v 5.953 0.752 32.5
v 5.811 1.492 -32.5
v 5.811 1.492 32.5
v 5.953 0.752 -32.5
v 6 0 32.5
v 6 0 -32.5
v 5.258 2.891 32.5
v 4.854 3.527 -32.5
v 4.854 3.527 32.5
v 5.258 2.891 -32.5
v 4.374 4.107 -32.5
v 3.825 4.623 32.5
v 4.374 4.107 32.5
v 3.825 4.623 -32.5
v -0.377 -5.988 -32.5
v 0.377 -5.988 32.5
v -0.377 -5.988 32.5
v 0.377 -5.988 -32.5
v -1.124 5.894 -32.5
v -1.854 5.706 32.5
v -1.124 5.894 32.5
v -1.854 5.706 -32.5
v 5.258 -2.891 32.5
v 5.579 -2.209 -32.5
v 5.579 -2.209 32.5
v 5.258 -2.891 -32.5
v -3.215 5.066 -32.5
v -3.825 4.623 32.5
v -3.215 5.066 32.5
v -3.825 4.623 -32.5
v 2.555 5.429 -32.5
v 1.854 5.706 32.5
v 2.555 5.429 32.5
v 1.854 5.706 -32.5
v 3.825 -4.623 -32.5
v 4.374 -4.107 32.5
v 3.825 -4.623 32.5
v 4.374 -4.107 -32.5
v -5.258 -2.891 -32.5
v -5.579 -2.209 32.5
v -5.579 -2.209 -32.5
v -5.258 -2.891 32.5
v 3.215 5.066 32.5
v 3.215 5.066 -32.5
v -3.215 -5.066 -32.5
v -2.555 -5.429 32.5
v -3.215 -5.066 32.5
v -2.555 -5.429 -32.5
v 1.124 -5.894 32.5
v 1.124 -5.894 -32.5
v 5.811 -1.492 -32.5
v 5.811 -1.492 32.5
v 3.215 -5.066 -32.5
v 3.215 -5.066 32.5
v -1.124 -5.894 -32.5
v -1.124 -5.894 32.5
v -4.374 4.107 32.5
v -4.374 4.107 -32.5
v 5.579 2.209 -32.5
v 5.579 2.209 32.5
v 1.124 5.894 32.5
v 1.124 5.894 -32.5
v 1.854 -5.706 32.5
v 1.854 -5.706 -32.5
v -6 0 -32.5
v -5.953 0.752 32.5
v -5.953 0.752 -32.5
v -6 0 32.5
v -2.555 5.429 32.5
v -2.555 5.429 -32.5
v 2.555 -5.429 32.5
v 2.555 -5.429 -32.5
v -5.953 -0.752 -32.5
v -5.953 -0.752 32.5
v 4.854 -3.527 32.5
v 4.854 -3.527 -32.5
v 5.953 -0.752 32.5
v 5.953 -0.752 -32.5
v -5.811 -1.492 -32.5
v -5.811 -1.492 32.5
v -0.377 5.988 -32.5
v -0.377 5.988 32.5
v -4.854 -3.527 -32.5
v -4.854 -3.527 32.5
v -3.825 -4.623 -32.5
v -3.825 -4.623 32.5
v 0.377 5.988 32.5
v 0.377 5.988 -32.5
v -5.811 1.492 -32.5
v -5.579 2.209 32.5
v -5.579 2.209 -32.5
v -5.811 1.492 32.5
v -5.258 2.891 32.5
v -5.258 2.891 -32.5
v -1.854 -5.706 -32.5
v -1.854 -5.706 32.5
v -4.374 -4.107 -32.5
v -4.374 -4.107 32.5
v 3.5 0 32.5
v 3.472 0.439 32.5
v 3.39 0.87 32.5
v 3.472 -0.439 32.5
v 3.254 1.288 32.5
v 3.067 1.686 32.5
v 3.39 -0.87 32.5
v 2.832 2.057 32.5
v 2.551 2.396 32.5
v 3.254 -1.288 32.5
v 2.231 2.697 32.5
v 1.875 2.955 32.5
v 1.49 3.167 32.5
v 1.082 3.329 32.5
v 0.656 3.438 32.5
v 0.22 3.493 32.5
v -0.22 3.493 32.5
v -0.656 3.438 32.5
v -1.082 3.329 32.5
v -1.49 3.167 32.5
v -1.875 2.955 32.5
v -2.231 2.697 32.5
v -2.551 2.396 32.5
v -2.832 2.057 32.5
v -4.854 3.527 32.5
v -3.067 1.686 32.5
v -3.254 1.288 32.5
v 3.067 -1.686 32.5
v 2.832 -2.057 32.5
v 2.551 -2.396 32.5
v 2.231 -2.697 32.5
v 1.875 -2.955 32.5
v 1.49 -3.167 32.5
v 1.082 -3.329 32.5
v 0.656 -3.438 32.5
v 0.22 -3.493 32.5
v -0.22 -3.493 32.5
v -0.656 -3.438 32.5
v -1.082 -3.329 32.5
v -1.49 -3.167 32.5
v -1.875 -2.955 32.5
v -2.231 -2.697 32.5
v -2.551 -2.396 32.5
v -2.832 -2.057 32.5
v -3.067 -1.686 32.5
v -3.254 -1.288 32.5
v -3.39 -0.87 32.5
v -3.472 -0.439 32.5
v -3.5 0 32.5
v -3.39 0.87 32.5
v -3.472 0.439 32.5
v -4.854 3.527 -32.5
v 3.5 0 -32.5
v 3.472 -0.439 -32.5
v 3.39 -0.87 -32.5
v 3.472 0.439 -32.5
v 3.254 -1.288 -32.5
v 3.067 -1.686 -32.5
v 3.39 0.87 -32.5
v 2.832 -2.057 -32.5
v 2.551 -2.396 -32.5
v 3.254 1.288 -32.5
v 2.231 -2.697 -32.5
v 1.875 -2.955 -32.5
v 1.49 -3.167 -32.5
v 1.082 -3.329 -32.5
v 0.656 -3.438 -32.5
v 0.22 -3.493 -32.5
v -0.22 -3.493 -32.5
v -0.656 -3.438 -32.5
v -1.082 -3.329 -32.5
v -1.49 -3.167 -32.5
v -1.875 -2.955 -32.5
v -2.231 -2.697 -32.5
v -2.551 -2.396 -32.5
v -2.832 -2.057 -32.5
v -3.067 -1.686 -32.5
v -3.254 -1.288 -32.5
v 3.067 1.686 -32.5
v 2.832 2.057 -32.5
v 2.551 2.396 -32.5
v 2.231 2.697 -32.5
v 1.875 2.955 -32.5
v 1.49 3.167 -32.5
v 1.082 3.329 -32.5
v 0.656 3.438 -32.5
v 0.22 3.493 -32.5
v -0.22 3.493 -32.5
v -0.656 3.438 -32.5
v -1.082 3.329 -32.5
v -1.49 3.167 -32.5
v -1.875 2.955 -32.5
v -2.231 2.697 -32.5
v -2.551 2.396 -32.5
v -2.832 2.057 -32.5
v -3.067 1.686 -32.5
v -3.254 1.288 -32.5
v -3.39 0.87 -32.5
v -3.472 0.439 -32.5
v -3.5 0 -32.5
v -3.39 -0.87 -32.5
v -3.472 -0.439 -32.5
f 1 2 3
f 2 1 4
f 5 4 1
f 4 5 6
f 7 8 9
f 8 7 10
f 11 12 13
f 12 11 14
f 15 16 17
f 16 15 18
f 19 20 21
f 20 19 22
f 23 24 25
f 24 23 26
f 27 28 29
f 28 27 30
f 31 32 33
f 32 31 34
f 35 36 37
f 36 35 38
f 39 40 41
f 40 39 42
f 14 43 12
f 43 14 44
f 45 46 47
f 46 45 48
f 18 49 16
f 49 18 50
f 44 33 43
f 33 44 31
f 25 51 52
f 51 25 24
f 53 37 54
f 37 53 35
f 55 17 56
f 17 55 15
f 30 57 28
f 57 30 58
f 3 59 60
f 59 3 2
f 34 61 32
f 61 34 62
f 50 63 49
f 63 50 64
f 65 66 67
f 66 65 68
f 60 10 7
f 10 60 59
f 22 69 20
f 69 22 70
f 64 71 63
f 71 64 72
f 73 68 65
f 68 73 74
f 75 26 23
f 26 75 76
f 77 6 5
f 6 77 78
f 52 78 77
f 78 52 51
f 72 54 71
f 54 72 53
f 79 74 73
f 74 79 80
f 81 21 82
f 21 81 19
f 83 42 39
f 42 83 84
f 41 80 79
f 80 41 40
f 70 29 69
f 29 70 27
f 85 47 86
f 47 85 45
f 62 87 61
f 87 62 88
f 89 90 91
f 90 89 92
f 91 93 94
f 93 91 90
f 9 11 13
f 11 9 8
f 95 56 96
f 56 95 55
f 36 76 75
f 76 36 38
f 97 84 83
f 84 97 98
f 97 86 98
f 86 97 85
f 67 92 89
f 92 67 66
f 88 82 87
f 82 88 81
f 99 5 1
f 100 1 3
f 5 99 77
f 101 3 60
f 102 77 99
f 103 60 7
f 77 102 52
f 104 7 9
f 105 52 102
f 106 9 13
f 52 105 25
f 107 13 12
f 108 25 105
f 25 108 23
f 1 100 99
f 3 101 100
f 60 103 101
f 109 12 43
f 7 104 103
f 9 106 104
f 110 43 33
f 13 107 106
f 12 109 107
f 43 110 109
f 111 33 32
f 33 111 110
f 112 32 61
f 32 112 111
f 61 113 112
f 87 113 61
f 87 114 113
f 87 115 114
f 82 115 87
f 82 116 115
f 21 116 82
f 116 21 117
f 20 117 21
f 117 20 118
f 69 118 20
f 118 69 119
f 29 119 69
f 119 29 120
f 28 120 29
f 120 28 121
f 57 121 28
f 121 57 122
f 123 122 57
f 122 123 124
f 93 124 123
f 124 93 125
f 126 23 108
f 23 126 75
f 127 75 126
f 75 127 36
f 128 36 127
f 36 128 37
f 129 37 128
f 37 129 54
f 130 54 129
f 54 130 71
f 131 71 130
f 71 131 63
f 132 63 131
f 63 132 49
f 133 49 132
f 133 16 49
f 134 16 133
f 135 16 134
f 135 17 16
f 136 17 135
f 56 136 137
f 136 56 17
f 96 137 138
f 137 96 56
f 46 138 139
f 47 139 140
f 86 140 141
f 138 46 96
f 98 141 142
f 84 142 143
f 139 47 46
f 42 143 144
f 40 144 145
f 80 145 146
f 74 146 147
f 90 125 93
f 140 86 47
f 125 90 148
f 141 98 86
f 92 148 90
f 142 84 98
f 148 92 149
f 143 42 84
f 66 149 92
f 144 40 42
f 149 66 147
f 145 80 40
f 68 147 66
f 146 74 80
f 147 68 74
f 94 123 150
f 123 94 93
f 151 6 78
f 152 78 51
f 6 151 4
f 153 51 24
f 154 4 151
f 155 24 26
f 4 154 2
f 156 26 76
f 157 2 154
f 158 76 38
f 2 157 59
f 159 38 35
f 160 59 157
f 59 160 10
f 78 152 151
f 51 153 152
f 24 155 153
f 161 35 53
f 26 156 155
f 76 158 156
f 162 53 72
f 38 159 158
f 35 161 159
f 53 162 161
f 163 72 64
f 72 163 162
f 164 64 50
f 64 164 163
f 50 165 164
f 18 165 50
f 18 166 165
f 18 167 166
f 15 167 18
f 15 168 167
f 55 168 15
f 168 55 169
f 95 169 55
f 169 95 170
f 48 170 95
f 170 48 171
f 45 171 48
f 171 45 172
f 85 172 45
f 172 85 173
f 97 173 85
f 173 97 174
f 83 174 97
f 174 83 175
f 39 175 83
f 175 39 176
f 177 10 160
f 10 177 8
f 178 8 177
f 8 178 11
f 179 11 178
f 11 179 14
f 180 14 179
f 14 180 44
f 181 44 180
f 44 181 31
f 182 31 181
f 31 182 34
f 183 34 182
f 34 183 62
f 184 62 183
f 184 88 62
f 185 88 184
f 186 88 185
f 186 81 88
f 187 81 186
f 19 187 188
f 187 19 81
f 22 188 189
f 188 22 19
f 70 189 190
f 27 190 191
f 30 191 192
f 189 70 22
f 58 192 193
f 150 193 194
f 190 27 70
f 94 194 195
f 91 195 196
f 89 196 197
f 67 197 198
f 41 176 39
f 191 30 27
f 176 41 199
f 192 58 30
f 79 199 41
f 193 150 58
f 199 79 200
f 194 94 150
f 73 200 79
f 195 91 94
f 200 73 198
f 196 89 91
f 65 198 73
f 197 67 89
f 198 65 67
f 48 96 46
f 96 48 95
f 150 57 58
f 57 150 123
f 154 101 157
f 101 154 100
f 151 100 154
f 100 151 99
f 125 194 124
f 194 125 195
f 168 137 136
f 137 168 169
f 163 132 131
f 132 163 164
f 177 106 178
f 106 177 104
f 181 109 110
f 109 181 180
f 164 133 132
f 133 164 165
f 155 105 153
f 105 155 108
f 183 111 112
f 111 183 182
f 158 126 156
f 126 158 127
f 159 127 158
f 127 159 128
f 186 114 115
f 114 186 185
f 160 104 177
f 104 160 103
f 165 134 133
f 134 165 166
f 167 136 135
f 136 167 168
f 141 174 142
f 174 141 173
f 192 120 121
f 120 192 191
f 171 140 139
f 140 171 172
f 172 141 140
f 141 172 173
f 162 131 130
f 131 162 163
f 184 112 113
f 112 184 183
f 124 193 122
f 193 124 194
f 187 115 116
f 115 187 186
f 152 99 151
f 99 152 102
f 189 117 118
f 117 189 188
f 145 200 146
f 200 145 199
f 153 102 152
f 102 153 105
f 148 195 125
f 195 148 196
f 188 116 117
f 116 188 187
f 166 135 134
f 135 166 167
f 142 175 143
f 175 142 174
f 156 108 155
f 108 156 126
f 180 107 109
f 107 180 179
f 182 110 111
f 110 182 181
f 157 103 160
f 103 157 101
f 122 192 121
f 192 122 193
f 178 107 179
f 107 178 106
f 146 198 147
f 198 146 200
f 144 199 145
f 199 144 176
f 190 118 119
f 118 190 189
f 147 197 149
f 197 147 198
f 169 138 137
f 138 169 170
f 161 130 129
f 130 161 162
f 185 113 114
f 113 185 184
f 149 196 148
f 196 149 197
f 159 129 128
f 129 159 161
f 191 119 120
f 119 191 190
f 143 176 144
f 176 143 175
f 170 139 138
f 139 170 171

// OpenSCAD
$fn = 50;


difference() {
	union() {
		translate(v = [0, 0, -32.5000000000]) {
			cylinder(h = 65, r = 6.0000000000);
		}
	}
	union() {
		translate(v = [0, 0, -100.0000000000]) {
			cylinder(h = 200, r = 3.5000000000);
		}
	}
}
